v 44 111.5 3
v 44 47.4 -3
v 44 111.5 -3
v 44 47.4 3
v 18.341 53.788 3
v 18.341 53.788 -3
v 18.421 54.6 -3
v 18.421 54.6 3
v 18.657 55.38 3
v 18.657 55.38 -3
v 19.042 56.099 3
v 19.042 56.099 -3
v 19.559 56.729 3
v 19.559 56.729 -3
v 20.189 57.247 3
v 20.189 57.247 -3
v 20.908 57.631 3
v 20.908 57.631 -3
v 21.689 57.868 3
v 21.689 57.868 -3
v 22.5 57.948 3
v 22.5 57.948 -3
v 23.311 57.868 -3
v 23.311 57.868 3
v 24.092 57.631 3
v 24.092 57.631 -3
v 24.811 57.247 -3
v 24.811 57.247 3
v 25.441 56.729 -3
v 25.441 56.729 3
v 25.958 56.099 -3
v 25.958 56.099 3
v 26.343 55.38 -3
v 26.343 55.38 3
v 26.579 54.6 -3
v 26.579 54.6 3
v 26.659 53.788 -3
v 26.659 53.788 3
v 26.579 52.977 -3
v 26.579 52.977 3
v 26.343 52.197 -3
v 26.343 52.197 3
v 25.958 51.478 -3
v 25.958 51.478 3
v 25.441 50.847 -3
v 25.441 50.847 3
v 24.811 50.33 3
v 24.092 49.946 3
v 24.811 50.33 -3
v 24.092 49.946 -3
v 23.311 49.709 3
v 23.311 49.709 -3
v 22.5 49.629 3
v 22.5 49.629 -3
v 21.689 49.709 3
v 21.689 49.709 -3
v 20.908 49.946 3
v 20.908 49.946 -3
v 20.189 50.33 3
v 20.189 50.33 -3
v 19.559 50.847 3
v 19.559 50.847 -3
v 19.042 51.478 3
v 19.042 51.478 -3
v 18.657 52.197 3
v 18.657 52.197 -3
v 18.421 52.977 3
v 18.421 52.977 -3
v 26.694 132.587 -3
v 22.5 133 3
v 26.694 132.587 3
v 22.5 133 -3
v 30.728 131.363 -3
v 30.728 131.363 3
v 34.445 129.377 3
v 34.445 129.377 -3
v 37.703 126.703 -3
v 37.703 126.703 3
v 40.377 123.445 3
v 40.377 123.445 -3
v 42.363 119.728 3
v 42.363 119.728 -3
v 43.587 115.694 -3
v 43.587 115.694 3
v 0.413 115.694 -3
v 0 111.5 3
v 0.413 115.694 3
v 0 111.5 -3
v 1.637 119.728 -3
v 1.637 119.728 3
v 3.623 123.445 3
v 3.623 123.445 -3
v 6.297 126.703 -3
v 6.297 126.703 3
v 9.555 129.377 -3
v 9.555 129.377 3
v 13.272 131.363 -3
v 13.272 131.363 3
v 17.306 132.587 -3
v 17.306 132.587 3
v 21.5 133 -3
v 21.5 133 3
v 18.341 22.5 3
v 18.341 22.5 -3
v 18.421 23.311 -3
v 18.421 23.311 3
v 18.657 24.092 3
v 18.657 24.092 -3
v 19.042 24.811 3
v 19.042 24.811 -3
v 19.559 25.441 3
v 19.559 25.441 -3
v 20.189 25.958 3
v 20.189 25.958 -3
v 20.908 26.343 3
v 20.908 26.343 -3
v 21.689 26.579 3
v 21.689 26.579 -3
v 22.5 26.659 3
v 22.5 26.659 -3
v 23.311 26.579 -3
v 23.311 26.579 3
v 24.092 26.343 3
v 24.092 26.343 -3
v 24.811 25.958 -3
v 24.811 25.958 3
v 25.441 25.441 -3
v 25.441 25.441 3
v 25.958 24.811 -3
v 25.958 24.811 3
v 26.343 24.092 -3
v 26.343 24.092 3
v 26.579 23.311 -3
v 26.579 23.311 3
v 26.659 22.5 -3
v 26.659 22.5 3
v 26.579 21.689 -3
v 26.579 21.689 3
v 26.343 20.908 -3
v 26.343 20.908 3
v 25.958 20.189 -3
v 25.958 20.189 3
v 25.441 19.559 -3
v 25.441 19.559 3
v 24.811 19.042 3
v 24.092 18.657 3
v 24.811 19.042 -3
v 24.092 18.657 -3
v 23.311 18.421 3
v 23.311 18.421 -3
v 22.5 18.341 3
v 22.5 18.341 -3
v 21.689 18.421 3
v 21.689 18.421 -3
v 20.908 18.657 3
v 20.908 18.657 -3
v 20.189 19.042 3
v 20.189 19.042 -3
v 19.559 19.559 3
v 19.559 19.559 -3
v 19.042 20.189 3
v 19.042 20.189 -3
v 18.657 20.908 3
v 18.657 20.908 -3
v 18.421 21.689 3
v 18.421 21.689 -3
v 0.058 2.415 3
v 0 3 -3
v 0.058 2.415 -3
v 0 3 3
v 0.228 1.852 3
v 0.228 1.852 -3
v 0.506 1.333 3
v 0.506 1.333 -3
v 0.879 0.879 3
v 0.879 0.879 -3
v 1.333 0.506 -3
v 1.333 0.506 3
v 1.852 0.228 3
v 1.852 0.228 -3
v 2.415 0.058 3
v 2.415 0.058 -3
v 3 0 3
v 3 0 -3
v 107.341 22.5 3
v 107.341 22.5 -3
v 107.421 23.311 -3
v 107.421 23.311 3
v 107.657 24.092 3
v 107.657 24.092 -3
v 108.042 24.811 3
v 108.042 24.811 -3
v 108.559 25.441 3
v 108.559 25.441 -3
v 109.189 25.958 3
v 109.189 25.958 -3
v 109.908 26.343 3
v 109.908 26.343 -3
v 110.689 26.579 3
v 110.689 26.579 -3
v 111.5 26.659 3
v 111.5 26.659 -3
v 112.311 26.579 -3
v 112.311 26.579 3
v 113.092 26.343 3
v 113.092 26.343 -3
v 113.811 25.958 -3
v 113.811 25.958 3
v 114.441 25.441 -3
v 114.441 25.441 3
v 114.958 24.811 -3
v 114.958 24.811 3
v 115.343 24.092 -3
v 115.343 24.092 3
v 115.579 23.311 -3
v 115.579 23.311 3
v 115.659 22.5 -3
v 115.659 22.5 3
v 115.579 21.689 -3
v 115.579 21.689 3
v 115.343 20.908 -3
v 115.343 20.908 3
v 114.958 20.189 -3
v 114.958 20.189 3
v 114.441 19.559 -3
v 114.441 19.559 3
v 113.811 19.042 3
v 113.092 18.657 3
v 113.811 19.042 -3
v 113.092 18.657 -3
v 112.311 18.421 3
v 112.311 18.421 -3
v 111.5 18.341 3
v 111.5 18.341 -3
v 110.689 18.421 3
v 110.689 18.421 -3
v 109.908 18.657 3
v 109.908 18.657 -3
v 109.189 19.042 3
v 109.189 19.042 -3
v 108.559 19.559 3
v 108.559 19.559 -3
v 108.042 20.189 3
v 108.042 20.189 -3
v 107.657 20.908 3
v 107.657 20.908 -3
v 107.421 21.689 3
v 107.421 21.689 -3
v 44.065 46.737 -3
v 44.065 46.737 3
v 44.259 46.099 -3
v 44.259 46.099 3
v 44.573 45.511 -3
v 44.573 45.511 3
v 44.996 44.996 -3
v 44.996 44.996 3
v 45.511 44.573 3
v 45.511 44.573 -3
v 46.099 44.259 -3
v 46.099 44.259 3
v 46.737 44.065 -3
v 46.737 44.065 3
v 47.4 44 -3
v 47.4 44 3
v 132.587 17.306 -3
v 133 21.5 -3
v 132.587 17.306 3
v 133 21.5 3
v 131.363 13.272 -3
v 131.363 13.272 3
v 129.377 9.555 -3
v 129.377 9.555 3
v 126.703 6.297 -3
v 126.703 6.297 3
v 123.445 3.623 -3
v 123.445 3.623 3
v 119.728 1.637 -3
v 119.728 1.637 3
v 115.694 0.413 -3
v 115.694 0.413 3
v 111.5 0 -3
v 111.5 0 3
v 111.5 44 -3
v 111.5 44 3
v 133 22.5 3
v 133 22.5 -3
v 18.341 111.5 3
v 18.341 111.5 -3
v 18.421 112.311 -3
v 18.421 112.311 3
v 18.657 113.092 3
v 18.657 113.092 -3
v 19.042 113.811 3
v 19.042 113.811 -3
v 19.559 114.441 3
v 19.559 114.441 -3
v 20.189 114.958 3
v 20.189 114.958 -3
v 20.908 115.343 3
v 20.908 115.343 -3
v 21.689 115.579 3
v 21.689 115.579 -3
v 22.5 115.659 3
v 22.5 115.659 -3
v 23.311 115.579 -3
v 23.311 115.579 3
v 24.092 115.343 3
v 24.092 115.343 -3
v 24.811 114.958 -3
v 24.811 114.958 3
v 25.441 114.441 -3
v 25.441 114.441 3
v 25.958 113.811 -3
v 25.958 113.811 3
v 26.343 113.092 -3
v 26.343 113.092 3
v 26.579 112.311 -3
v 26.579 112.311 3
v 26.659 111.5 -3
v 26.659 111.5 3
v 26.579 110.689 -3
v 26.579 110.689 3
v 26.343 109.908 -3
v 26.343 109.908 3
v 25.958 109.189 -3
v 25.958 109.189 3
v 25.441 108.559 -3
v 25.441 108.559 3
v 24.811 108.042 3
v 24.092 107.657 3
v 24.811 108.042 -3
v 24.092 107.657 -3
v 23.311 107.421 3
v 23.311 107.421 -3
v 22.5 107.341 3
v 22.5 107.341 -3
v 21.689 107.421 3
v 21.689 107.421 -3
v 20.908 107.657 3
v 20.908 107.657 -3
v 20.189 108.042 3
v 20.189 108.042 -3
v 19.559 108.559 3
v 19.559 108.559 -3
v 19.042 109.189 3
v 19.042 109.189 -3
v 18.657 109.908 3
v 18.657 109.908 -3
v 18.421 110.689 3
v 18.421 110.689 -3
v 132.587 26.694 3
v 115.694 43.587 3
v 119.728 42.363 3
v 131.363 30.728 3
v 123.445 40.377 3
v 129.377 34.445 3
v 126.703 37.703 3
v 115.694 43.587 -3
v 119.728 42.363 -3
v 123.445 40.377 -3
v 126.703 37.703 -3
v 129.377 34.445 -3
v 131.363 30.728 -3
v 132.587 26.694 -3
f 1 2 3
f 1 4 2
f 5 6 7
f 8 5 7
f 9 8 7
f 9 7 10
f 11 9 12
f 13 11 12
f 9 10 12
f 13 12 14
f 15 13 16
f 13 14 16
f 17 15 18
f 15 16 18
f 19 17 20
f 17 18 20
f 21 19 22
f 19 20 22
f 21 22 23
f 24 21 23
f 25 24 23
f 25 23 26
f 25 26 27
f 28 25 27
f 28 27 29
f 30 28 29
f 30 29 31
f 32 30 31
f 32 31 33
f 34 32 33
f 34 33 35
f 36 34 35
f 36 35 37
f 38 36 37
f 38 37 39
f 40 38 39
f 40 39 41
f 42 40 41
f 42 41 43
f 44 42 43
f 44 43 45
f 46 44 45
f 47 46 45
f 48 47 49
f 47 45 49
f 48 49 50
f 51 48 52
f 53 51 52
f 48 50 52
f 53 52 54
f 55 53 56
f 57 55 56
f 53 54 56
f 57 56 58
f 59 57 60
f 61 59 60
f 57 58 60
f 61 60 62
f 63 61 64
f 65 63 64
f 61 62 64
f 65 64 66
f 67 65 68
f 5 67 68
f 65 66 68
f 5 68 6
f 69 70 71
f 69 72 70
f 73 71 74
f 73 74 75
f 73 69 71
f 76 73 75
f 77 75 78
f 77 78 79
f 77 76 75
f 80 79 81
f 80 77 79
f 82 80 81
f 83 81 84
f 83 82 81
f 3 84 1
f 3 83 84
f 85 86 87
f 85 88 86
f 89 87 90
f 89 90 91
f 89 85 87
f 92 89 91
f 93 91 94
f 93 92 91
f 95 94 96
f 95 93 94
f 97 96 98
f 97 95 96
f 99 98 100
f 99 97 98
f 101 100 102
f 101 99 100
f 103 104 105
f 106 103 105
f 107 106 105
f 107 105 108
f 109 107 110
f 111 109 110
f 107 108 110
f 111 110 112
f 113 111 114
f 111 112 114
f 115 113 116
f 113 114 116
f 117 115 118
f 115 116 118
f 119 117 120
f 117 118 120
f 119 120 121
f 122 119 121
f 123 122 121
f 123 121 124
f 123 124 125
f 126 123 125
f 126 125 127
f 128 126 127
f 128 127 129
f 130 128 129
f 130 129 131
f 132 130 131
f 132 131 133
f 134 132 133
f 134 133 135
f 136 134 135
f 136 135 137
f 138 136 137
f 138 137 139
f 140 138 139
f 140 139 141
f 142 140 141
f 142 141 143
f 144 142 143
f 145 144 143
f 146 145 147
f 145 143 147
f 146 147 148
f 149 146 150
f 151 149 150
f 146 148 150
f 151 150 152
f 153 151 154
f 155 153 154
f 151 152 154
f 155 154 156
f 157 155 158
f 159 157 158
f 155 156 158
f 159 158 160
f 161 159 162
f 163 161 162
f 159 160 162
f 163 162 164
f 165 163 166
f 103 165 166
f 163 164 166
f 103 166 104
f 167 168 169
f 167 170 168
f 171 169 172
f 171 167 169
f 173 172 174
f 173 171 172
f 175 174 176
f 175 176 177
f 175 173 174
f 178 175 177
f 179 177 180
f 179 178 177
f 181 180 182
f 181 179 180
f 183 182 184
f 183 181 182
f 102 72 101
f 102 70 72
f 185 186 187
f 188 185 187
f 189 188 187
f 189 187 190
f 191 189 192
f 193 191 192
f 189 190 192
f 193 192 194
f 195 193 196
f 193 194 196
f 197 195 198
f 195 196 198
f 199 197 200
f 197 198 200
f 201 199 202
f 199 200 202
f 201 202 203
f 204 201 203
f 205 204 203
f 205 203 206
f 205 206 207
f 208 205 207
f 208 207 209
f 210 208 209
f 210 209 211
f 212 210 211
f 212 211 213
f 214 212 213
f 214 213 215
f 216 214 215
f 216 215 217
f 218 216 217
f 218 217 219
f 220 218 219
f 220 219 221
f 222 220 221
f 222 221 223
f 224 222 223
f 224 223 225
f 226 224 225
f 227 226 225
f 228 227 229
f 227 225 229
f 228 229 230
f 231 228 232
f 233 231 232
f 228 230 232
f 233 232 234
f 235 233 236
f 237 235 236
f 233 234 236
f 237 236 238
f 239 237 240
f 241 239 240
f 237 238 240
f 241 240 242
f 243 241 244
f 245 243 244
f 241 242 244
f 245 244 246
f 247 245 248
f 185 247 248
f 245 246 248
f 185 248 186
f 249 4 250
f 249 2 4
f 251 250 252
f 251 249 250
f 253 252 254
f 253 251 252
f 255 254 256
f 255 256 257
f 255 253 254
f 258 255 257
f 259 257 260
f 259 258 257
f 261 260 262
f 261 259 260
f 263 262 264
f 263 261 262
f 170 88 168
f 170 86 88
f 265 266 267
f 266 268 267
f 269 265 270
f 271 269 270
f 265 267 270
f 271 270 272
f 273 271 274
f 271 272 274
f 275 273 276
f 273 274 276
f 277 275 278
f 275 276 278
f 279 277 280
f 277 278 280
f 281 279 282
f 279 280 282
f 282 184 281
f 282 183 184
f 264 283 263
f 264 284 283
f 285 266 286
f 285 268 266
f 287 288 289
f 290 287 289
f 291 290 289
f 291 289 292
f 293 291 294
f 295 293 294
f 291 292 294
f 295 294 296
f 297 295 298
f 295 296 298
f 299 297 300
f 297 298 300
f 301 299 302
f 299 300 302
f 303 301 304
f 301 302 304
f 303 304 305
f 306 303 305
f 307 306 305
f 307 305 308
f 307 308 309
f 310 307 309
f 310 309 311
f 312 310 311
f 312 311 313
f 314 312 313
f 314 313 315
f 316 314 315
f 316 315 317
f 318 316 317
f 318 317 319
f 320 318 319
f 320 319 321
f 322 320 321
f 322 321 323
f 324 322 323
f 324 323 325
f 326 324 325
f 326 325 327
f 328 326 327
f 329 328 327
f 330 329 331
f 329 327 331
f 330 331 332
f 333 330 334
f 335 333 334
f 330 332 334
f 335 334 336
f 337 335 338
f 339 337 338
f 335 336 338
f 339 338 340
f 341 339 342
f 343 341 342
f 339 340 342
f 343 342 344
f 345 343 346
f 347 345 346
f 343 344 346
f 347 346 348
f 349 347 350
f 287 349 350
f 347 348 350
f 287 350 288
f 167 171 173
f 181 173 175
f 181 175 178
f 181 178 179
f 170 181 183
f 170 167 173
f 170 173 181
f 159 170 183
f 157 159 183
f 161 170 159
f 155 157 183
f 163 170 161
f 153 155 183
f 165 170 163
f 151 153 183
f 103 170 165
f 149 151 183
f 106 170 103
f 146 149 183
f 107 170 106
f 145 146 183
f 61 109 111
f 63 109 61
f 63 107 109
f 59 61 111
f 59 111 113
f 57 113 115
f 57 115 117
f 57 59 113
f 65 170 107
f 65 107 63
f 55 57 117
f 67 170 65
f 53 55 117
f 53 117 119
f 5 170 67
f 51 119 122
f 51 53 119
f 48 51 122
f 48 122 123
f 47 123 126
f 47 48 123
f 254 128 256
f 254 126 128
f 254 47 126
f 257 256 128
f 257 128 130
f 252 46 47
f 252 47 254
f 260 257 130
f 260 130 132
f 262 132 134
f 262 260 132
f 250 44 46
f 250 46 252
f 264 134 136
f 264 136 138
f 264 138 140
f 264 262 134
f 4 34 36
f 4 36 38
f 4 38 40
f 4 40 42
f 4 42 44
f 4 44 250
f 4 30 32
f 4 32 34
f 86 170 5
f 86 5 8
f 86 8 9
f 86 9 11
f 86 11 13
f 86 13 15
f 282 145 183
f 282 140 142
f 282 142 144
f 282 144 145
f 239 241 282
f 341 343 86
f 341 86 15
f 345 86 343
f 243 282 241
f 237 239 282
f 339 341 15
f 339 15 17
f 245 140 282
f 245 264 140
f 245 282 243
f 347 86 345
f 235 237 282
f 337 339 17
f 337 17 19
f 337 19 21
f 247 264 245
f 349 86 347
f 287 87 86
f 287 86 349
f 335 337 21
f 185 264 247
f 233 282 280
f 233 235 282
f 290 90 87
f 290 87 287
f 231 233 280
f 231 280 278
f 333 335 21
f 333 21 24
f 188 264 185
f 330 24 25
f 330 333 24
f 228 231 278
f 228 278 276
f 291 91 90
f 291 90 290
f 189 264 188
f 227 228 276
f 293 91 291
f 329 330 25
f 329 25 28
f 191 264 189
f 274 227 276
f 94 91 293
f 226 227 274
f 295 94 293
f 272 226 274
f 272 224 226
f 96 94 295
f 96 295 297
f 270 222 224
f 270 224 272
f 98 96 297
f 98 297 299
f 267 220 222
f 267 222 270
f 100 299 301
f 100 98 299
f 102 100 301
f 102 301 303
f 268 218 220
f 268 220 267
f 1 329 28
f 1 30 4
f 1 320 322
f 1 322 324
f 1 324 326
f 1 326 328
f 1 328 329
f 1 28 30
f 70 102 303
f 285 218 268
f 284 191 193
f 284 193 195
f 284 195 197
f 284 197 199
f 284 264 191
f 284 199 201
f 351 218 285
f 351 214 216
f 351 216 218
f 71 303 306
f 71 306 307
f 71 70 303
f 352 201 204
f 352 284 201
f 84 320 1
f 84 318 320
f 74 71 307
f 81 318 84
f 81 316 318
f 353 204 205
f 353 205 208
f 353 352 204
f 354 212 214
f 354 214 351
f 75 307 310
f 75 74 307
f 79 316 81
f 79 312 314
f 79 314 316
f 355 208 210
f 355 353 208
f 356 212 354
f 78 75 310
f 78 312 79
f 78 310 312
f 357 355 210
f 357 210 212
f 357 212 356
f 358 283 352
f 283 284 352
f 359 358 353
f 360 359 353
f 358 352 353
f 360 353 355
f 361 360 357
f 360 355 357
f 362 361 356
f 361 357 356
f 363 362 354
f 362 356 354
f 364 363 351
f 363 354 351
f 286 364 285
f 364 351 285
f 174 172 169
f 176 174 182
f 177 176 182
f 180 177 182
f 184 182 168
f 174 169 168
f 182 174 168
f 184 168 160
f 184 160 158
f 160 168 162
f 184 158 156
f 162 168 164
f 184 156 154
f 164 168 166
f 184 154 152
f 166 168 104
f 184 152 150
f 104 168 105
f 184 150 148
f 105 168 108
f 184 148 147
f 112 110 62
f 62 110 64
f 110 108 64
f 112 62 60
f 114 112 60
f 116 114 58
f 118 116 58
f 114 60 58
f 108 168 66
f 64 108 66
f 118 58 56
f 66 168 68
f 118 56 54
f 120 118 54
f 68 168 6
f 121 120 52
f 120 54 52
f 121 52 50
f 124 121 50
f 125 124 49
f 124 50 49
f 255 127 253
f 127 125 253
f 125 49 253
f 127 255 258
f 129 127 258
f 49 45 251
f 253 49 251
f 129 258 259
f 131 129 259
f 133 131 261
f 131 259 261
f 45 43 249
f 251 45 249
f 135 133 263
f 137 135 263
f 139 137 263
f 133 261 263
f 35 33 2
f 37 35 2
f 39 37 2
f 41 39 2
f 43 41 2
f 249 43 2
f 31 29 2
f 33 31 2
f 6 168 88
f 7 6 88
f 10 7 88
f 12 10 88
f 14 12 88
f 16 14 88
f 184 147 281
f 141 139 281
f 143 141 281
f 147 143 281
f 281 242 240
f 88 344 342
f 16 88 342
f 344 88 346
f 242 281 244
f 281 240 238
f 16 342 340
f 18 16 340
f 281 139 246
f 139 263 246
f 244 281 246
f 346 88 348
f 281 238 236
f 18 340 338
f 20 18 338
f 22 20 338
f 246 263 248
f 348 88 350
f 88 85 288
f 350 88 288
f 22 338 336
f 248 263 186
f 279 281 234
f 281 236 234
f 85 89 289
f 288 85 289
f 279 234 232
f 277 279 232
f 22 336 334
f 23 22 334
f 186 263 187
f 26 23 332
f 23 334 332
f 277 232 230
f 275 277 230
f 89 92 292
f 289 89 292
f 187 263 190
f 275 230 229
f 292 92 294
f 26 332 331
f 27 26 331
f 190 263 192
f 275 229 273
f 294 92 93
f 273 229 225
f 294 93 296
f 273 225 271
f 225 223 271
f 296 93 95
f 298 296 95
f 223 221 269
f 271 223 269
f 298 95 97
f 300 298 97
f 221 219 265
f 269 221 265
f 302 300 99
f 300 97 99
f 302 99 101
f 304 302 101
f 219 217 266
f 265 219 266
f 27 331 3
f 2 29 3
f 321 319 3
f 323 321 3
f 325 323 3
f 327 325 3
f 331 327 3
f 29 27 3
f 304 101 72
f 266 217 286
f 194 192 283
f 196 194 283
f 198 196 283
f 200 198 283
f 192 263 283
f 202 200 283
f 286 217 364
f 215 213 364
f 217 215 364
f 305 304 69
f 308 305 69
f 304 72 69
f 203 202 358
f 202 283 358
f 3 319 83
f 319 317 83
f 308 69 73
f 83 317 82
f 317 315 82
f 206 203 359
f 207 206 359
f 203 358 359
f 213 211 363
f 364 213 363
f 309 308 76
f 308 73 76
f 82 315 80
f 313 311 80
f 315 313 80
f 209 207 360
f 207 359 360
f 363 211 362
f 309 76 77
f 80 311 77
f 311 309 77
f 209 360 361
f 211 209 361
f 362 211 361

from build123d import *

# Parameters (mm, degrees)
BOSS_EXTRUDE1_DEPTH      = 3
FILLET4_R                = 21.5
FILLET5_R                = 3.4
FILLET6_R                = 3
F_5_16_CLEARANCE_HOLE1_D = 8.3185


with BuildPart() as part:
    # Sketch1 → Boss-Extrude1 (new, symmetric)
    with BuildSketch(Plane.XY):
        Polygon((0, 133), (0, 0), (133, 0), (133, 44), (44, 44), (44, 133), align=None)
    extrude(amount=BOSS_EXTRUDE1_DEPTH, both=True)

    # Fillet4
    fillet4_edges = [part.edges().sort_by_distance(p)[0] for p in [
        (133, 44, 0),
        (133, 0, 0),
        (0, 133, 0),
        (44, 133, 0),
    ]]
    fillet(fillet4_edges, radius=FILLET4_R)

    # Fillet5
    fillet5_edges = [part.edges().sort_by_distance(p)[0] for p in [
        (44, 44, 0),
    ]]
    fillet(fillet5_edges, radius=FILLET5_R)

    # Fillet6
    fillet6_edges = [part.edges().sort_by_distance(p)[0] for p in [
        (0, 0, 0),
    ]]
    fillet(fillet6_edges, radius=FILLET6_R)

    # 5/16 Clearance Hole1 (through all)
    with Locations(Plane.XY.offset(3)):
        with Locations((22.5, 111.5), (22.5, 53.7884), (22.5, 22.5), (111.5, 22.5)):
            Hole(F_5_16_CLEARANCE_HOLE1_D / 2)


solid = part.part
